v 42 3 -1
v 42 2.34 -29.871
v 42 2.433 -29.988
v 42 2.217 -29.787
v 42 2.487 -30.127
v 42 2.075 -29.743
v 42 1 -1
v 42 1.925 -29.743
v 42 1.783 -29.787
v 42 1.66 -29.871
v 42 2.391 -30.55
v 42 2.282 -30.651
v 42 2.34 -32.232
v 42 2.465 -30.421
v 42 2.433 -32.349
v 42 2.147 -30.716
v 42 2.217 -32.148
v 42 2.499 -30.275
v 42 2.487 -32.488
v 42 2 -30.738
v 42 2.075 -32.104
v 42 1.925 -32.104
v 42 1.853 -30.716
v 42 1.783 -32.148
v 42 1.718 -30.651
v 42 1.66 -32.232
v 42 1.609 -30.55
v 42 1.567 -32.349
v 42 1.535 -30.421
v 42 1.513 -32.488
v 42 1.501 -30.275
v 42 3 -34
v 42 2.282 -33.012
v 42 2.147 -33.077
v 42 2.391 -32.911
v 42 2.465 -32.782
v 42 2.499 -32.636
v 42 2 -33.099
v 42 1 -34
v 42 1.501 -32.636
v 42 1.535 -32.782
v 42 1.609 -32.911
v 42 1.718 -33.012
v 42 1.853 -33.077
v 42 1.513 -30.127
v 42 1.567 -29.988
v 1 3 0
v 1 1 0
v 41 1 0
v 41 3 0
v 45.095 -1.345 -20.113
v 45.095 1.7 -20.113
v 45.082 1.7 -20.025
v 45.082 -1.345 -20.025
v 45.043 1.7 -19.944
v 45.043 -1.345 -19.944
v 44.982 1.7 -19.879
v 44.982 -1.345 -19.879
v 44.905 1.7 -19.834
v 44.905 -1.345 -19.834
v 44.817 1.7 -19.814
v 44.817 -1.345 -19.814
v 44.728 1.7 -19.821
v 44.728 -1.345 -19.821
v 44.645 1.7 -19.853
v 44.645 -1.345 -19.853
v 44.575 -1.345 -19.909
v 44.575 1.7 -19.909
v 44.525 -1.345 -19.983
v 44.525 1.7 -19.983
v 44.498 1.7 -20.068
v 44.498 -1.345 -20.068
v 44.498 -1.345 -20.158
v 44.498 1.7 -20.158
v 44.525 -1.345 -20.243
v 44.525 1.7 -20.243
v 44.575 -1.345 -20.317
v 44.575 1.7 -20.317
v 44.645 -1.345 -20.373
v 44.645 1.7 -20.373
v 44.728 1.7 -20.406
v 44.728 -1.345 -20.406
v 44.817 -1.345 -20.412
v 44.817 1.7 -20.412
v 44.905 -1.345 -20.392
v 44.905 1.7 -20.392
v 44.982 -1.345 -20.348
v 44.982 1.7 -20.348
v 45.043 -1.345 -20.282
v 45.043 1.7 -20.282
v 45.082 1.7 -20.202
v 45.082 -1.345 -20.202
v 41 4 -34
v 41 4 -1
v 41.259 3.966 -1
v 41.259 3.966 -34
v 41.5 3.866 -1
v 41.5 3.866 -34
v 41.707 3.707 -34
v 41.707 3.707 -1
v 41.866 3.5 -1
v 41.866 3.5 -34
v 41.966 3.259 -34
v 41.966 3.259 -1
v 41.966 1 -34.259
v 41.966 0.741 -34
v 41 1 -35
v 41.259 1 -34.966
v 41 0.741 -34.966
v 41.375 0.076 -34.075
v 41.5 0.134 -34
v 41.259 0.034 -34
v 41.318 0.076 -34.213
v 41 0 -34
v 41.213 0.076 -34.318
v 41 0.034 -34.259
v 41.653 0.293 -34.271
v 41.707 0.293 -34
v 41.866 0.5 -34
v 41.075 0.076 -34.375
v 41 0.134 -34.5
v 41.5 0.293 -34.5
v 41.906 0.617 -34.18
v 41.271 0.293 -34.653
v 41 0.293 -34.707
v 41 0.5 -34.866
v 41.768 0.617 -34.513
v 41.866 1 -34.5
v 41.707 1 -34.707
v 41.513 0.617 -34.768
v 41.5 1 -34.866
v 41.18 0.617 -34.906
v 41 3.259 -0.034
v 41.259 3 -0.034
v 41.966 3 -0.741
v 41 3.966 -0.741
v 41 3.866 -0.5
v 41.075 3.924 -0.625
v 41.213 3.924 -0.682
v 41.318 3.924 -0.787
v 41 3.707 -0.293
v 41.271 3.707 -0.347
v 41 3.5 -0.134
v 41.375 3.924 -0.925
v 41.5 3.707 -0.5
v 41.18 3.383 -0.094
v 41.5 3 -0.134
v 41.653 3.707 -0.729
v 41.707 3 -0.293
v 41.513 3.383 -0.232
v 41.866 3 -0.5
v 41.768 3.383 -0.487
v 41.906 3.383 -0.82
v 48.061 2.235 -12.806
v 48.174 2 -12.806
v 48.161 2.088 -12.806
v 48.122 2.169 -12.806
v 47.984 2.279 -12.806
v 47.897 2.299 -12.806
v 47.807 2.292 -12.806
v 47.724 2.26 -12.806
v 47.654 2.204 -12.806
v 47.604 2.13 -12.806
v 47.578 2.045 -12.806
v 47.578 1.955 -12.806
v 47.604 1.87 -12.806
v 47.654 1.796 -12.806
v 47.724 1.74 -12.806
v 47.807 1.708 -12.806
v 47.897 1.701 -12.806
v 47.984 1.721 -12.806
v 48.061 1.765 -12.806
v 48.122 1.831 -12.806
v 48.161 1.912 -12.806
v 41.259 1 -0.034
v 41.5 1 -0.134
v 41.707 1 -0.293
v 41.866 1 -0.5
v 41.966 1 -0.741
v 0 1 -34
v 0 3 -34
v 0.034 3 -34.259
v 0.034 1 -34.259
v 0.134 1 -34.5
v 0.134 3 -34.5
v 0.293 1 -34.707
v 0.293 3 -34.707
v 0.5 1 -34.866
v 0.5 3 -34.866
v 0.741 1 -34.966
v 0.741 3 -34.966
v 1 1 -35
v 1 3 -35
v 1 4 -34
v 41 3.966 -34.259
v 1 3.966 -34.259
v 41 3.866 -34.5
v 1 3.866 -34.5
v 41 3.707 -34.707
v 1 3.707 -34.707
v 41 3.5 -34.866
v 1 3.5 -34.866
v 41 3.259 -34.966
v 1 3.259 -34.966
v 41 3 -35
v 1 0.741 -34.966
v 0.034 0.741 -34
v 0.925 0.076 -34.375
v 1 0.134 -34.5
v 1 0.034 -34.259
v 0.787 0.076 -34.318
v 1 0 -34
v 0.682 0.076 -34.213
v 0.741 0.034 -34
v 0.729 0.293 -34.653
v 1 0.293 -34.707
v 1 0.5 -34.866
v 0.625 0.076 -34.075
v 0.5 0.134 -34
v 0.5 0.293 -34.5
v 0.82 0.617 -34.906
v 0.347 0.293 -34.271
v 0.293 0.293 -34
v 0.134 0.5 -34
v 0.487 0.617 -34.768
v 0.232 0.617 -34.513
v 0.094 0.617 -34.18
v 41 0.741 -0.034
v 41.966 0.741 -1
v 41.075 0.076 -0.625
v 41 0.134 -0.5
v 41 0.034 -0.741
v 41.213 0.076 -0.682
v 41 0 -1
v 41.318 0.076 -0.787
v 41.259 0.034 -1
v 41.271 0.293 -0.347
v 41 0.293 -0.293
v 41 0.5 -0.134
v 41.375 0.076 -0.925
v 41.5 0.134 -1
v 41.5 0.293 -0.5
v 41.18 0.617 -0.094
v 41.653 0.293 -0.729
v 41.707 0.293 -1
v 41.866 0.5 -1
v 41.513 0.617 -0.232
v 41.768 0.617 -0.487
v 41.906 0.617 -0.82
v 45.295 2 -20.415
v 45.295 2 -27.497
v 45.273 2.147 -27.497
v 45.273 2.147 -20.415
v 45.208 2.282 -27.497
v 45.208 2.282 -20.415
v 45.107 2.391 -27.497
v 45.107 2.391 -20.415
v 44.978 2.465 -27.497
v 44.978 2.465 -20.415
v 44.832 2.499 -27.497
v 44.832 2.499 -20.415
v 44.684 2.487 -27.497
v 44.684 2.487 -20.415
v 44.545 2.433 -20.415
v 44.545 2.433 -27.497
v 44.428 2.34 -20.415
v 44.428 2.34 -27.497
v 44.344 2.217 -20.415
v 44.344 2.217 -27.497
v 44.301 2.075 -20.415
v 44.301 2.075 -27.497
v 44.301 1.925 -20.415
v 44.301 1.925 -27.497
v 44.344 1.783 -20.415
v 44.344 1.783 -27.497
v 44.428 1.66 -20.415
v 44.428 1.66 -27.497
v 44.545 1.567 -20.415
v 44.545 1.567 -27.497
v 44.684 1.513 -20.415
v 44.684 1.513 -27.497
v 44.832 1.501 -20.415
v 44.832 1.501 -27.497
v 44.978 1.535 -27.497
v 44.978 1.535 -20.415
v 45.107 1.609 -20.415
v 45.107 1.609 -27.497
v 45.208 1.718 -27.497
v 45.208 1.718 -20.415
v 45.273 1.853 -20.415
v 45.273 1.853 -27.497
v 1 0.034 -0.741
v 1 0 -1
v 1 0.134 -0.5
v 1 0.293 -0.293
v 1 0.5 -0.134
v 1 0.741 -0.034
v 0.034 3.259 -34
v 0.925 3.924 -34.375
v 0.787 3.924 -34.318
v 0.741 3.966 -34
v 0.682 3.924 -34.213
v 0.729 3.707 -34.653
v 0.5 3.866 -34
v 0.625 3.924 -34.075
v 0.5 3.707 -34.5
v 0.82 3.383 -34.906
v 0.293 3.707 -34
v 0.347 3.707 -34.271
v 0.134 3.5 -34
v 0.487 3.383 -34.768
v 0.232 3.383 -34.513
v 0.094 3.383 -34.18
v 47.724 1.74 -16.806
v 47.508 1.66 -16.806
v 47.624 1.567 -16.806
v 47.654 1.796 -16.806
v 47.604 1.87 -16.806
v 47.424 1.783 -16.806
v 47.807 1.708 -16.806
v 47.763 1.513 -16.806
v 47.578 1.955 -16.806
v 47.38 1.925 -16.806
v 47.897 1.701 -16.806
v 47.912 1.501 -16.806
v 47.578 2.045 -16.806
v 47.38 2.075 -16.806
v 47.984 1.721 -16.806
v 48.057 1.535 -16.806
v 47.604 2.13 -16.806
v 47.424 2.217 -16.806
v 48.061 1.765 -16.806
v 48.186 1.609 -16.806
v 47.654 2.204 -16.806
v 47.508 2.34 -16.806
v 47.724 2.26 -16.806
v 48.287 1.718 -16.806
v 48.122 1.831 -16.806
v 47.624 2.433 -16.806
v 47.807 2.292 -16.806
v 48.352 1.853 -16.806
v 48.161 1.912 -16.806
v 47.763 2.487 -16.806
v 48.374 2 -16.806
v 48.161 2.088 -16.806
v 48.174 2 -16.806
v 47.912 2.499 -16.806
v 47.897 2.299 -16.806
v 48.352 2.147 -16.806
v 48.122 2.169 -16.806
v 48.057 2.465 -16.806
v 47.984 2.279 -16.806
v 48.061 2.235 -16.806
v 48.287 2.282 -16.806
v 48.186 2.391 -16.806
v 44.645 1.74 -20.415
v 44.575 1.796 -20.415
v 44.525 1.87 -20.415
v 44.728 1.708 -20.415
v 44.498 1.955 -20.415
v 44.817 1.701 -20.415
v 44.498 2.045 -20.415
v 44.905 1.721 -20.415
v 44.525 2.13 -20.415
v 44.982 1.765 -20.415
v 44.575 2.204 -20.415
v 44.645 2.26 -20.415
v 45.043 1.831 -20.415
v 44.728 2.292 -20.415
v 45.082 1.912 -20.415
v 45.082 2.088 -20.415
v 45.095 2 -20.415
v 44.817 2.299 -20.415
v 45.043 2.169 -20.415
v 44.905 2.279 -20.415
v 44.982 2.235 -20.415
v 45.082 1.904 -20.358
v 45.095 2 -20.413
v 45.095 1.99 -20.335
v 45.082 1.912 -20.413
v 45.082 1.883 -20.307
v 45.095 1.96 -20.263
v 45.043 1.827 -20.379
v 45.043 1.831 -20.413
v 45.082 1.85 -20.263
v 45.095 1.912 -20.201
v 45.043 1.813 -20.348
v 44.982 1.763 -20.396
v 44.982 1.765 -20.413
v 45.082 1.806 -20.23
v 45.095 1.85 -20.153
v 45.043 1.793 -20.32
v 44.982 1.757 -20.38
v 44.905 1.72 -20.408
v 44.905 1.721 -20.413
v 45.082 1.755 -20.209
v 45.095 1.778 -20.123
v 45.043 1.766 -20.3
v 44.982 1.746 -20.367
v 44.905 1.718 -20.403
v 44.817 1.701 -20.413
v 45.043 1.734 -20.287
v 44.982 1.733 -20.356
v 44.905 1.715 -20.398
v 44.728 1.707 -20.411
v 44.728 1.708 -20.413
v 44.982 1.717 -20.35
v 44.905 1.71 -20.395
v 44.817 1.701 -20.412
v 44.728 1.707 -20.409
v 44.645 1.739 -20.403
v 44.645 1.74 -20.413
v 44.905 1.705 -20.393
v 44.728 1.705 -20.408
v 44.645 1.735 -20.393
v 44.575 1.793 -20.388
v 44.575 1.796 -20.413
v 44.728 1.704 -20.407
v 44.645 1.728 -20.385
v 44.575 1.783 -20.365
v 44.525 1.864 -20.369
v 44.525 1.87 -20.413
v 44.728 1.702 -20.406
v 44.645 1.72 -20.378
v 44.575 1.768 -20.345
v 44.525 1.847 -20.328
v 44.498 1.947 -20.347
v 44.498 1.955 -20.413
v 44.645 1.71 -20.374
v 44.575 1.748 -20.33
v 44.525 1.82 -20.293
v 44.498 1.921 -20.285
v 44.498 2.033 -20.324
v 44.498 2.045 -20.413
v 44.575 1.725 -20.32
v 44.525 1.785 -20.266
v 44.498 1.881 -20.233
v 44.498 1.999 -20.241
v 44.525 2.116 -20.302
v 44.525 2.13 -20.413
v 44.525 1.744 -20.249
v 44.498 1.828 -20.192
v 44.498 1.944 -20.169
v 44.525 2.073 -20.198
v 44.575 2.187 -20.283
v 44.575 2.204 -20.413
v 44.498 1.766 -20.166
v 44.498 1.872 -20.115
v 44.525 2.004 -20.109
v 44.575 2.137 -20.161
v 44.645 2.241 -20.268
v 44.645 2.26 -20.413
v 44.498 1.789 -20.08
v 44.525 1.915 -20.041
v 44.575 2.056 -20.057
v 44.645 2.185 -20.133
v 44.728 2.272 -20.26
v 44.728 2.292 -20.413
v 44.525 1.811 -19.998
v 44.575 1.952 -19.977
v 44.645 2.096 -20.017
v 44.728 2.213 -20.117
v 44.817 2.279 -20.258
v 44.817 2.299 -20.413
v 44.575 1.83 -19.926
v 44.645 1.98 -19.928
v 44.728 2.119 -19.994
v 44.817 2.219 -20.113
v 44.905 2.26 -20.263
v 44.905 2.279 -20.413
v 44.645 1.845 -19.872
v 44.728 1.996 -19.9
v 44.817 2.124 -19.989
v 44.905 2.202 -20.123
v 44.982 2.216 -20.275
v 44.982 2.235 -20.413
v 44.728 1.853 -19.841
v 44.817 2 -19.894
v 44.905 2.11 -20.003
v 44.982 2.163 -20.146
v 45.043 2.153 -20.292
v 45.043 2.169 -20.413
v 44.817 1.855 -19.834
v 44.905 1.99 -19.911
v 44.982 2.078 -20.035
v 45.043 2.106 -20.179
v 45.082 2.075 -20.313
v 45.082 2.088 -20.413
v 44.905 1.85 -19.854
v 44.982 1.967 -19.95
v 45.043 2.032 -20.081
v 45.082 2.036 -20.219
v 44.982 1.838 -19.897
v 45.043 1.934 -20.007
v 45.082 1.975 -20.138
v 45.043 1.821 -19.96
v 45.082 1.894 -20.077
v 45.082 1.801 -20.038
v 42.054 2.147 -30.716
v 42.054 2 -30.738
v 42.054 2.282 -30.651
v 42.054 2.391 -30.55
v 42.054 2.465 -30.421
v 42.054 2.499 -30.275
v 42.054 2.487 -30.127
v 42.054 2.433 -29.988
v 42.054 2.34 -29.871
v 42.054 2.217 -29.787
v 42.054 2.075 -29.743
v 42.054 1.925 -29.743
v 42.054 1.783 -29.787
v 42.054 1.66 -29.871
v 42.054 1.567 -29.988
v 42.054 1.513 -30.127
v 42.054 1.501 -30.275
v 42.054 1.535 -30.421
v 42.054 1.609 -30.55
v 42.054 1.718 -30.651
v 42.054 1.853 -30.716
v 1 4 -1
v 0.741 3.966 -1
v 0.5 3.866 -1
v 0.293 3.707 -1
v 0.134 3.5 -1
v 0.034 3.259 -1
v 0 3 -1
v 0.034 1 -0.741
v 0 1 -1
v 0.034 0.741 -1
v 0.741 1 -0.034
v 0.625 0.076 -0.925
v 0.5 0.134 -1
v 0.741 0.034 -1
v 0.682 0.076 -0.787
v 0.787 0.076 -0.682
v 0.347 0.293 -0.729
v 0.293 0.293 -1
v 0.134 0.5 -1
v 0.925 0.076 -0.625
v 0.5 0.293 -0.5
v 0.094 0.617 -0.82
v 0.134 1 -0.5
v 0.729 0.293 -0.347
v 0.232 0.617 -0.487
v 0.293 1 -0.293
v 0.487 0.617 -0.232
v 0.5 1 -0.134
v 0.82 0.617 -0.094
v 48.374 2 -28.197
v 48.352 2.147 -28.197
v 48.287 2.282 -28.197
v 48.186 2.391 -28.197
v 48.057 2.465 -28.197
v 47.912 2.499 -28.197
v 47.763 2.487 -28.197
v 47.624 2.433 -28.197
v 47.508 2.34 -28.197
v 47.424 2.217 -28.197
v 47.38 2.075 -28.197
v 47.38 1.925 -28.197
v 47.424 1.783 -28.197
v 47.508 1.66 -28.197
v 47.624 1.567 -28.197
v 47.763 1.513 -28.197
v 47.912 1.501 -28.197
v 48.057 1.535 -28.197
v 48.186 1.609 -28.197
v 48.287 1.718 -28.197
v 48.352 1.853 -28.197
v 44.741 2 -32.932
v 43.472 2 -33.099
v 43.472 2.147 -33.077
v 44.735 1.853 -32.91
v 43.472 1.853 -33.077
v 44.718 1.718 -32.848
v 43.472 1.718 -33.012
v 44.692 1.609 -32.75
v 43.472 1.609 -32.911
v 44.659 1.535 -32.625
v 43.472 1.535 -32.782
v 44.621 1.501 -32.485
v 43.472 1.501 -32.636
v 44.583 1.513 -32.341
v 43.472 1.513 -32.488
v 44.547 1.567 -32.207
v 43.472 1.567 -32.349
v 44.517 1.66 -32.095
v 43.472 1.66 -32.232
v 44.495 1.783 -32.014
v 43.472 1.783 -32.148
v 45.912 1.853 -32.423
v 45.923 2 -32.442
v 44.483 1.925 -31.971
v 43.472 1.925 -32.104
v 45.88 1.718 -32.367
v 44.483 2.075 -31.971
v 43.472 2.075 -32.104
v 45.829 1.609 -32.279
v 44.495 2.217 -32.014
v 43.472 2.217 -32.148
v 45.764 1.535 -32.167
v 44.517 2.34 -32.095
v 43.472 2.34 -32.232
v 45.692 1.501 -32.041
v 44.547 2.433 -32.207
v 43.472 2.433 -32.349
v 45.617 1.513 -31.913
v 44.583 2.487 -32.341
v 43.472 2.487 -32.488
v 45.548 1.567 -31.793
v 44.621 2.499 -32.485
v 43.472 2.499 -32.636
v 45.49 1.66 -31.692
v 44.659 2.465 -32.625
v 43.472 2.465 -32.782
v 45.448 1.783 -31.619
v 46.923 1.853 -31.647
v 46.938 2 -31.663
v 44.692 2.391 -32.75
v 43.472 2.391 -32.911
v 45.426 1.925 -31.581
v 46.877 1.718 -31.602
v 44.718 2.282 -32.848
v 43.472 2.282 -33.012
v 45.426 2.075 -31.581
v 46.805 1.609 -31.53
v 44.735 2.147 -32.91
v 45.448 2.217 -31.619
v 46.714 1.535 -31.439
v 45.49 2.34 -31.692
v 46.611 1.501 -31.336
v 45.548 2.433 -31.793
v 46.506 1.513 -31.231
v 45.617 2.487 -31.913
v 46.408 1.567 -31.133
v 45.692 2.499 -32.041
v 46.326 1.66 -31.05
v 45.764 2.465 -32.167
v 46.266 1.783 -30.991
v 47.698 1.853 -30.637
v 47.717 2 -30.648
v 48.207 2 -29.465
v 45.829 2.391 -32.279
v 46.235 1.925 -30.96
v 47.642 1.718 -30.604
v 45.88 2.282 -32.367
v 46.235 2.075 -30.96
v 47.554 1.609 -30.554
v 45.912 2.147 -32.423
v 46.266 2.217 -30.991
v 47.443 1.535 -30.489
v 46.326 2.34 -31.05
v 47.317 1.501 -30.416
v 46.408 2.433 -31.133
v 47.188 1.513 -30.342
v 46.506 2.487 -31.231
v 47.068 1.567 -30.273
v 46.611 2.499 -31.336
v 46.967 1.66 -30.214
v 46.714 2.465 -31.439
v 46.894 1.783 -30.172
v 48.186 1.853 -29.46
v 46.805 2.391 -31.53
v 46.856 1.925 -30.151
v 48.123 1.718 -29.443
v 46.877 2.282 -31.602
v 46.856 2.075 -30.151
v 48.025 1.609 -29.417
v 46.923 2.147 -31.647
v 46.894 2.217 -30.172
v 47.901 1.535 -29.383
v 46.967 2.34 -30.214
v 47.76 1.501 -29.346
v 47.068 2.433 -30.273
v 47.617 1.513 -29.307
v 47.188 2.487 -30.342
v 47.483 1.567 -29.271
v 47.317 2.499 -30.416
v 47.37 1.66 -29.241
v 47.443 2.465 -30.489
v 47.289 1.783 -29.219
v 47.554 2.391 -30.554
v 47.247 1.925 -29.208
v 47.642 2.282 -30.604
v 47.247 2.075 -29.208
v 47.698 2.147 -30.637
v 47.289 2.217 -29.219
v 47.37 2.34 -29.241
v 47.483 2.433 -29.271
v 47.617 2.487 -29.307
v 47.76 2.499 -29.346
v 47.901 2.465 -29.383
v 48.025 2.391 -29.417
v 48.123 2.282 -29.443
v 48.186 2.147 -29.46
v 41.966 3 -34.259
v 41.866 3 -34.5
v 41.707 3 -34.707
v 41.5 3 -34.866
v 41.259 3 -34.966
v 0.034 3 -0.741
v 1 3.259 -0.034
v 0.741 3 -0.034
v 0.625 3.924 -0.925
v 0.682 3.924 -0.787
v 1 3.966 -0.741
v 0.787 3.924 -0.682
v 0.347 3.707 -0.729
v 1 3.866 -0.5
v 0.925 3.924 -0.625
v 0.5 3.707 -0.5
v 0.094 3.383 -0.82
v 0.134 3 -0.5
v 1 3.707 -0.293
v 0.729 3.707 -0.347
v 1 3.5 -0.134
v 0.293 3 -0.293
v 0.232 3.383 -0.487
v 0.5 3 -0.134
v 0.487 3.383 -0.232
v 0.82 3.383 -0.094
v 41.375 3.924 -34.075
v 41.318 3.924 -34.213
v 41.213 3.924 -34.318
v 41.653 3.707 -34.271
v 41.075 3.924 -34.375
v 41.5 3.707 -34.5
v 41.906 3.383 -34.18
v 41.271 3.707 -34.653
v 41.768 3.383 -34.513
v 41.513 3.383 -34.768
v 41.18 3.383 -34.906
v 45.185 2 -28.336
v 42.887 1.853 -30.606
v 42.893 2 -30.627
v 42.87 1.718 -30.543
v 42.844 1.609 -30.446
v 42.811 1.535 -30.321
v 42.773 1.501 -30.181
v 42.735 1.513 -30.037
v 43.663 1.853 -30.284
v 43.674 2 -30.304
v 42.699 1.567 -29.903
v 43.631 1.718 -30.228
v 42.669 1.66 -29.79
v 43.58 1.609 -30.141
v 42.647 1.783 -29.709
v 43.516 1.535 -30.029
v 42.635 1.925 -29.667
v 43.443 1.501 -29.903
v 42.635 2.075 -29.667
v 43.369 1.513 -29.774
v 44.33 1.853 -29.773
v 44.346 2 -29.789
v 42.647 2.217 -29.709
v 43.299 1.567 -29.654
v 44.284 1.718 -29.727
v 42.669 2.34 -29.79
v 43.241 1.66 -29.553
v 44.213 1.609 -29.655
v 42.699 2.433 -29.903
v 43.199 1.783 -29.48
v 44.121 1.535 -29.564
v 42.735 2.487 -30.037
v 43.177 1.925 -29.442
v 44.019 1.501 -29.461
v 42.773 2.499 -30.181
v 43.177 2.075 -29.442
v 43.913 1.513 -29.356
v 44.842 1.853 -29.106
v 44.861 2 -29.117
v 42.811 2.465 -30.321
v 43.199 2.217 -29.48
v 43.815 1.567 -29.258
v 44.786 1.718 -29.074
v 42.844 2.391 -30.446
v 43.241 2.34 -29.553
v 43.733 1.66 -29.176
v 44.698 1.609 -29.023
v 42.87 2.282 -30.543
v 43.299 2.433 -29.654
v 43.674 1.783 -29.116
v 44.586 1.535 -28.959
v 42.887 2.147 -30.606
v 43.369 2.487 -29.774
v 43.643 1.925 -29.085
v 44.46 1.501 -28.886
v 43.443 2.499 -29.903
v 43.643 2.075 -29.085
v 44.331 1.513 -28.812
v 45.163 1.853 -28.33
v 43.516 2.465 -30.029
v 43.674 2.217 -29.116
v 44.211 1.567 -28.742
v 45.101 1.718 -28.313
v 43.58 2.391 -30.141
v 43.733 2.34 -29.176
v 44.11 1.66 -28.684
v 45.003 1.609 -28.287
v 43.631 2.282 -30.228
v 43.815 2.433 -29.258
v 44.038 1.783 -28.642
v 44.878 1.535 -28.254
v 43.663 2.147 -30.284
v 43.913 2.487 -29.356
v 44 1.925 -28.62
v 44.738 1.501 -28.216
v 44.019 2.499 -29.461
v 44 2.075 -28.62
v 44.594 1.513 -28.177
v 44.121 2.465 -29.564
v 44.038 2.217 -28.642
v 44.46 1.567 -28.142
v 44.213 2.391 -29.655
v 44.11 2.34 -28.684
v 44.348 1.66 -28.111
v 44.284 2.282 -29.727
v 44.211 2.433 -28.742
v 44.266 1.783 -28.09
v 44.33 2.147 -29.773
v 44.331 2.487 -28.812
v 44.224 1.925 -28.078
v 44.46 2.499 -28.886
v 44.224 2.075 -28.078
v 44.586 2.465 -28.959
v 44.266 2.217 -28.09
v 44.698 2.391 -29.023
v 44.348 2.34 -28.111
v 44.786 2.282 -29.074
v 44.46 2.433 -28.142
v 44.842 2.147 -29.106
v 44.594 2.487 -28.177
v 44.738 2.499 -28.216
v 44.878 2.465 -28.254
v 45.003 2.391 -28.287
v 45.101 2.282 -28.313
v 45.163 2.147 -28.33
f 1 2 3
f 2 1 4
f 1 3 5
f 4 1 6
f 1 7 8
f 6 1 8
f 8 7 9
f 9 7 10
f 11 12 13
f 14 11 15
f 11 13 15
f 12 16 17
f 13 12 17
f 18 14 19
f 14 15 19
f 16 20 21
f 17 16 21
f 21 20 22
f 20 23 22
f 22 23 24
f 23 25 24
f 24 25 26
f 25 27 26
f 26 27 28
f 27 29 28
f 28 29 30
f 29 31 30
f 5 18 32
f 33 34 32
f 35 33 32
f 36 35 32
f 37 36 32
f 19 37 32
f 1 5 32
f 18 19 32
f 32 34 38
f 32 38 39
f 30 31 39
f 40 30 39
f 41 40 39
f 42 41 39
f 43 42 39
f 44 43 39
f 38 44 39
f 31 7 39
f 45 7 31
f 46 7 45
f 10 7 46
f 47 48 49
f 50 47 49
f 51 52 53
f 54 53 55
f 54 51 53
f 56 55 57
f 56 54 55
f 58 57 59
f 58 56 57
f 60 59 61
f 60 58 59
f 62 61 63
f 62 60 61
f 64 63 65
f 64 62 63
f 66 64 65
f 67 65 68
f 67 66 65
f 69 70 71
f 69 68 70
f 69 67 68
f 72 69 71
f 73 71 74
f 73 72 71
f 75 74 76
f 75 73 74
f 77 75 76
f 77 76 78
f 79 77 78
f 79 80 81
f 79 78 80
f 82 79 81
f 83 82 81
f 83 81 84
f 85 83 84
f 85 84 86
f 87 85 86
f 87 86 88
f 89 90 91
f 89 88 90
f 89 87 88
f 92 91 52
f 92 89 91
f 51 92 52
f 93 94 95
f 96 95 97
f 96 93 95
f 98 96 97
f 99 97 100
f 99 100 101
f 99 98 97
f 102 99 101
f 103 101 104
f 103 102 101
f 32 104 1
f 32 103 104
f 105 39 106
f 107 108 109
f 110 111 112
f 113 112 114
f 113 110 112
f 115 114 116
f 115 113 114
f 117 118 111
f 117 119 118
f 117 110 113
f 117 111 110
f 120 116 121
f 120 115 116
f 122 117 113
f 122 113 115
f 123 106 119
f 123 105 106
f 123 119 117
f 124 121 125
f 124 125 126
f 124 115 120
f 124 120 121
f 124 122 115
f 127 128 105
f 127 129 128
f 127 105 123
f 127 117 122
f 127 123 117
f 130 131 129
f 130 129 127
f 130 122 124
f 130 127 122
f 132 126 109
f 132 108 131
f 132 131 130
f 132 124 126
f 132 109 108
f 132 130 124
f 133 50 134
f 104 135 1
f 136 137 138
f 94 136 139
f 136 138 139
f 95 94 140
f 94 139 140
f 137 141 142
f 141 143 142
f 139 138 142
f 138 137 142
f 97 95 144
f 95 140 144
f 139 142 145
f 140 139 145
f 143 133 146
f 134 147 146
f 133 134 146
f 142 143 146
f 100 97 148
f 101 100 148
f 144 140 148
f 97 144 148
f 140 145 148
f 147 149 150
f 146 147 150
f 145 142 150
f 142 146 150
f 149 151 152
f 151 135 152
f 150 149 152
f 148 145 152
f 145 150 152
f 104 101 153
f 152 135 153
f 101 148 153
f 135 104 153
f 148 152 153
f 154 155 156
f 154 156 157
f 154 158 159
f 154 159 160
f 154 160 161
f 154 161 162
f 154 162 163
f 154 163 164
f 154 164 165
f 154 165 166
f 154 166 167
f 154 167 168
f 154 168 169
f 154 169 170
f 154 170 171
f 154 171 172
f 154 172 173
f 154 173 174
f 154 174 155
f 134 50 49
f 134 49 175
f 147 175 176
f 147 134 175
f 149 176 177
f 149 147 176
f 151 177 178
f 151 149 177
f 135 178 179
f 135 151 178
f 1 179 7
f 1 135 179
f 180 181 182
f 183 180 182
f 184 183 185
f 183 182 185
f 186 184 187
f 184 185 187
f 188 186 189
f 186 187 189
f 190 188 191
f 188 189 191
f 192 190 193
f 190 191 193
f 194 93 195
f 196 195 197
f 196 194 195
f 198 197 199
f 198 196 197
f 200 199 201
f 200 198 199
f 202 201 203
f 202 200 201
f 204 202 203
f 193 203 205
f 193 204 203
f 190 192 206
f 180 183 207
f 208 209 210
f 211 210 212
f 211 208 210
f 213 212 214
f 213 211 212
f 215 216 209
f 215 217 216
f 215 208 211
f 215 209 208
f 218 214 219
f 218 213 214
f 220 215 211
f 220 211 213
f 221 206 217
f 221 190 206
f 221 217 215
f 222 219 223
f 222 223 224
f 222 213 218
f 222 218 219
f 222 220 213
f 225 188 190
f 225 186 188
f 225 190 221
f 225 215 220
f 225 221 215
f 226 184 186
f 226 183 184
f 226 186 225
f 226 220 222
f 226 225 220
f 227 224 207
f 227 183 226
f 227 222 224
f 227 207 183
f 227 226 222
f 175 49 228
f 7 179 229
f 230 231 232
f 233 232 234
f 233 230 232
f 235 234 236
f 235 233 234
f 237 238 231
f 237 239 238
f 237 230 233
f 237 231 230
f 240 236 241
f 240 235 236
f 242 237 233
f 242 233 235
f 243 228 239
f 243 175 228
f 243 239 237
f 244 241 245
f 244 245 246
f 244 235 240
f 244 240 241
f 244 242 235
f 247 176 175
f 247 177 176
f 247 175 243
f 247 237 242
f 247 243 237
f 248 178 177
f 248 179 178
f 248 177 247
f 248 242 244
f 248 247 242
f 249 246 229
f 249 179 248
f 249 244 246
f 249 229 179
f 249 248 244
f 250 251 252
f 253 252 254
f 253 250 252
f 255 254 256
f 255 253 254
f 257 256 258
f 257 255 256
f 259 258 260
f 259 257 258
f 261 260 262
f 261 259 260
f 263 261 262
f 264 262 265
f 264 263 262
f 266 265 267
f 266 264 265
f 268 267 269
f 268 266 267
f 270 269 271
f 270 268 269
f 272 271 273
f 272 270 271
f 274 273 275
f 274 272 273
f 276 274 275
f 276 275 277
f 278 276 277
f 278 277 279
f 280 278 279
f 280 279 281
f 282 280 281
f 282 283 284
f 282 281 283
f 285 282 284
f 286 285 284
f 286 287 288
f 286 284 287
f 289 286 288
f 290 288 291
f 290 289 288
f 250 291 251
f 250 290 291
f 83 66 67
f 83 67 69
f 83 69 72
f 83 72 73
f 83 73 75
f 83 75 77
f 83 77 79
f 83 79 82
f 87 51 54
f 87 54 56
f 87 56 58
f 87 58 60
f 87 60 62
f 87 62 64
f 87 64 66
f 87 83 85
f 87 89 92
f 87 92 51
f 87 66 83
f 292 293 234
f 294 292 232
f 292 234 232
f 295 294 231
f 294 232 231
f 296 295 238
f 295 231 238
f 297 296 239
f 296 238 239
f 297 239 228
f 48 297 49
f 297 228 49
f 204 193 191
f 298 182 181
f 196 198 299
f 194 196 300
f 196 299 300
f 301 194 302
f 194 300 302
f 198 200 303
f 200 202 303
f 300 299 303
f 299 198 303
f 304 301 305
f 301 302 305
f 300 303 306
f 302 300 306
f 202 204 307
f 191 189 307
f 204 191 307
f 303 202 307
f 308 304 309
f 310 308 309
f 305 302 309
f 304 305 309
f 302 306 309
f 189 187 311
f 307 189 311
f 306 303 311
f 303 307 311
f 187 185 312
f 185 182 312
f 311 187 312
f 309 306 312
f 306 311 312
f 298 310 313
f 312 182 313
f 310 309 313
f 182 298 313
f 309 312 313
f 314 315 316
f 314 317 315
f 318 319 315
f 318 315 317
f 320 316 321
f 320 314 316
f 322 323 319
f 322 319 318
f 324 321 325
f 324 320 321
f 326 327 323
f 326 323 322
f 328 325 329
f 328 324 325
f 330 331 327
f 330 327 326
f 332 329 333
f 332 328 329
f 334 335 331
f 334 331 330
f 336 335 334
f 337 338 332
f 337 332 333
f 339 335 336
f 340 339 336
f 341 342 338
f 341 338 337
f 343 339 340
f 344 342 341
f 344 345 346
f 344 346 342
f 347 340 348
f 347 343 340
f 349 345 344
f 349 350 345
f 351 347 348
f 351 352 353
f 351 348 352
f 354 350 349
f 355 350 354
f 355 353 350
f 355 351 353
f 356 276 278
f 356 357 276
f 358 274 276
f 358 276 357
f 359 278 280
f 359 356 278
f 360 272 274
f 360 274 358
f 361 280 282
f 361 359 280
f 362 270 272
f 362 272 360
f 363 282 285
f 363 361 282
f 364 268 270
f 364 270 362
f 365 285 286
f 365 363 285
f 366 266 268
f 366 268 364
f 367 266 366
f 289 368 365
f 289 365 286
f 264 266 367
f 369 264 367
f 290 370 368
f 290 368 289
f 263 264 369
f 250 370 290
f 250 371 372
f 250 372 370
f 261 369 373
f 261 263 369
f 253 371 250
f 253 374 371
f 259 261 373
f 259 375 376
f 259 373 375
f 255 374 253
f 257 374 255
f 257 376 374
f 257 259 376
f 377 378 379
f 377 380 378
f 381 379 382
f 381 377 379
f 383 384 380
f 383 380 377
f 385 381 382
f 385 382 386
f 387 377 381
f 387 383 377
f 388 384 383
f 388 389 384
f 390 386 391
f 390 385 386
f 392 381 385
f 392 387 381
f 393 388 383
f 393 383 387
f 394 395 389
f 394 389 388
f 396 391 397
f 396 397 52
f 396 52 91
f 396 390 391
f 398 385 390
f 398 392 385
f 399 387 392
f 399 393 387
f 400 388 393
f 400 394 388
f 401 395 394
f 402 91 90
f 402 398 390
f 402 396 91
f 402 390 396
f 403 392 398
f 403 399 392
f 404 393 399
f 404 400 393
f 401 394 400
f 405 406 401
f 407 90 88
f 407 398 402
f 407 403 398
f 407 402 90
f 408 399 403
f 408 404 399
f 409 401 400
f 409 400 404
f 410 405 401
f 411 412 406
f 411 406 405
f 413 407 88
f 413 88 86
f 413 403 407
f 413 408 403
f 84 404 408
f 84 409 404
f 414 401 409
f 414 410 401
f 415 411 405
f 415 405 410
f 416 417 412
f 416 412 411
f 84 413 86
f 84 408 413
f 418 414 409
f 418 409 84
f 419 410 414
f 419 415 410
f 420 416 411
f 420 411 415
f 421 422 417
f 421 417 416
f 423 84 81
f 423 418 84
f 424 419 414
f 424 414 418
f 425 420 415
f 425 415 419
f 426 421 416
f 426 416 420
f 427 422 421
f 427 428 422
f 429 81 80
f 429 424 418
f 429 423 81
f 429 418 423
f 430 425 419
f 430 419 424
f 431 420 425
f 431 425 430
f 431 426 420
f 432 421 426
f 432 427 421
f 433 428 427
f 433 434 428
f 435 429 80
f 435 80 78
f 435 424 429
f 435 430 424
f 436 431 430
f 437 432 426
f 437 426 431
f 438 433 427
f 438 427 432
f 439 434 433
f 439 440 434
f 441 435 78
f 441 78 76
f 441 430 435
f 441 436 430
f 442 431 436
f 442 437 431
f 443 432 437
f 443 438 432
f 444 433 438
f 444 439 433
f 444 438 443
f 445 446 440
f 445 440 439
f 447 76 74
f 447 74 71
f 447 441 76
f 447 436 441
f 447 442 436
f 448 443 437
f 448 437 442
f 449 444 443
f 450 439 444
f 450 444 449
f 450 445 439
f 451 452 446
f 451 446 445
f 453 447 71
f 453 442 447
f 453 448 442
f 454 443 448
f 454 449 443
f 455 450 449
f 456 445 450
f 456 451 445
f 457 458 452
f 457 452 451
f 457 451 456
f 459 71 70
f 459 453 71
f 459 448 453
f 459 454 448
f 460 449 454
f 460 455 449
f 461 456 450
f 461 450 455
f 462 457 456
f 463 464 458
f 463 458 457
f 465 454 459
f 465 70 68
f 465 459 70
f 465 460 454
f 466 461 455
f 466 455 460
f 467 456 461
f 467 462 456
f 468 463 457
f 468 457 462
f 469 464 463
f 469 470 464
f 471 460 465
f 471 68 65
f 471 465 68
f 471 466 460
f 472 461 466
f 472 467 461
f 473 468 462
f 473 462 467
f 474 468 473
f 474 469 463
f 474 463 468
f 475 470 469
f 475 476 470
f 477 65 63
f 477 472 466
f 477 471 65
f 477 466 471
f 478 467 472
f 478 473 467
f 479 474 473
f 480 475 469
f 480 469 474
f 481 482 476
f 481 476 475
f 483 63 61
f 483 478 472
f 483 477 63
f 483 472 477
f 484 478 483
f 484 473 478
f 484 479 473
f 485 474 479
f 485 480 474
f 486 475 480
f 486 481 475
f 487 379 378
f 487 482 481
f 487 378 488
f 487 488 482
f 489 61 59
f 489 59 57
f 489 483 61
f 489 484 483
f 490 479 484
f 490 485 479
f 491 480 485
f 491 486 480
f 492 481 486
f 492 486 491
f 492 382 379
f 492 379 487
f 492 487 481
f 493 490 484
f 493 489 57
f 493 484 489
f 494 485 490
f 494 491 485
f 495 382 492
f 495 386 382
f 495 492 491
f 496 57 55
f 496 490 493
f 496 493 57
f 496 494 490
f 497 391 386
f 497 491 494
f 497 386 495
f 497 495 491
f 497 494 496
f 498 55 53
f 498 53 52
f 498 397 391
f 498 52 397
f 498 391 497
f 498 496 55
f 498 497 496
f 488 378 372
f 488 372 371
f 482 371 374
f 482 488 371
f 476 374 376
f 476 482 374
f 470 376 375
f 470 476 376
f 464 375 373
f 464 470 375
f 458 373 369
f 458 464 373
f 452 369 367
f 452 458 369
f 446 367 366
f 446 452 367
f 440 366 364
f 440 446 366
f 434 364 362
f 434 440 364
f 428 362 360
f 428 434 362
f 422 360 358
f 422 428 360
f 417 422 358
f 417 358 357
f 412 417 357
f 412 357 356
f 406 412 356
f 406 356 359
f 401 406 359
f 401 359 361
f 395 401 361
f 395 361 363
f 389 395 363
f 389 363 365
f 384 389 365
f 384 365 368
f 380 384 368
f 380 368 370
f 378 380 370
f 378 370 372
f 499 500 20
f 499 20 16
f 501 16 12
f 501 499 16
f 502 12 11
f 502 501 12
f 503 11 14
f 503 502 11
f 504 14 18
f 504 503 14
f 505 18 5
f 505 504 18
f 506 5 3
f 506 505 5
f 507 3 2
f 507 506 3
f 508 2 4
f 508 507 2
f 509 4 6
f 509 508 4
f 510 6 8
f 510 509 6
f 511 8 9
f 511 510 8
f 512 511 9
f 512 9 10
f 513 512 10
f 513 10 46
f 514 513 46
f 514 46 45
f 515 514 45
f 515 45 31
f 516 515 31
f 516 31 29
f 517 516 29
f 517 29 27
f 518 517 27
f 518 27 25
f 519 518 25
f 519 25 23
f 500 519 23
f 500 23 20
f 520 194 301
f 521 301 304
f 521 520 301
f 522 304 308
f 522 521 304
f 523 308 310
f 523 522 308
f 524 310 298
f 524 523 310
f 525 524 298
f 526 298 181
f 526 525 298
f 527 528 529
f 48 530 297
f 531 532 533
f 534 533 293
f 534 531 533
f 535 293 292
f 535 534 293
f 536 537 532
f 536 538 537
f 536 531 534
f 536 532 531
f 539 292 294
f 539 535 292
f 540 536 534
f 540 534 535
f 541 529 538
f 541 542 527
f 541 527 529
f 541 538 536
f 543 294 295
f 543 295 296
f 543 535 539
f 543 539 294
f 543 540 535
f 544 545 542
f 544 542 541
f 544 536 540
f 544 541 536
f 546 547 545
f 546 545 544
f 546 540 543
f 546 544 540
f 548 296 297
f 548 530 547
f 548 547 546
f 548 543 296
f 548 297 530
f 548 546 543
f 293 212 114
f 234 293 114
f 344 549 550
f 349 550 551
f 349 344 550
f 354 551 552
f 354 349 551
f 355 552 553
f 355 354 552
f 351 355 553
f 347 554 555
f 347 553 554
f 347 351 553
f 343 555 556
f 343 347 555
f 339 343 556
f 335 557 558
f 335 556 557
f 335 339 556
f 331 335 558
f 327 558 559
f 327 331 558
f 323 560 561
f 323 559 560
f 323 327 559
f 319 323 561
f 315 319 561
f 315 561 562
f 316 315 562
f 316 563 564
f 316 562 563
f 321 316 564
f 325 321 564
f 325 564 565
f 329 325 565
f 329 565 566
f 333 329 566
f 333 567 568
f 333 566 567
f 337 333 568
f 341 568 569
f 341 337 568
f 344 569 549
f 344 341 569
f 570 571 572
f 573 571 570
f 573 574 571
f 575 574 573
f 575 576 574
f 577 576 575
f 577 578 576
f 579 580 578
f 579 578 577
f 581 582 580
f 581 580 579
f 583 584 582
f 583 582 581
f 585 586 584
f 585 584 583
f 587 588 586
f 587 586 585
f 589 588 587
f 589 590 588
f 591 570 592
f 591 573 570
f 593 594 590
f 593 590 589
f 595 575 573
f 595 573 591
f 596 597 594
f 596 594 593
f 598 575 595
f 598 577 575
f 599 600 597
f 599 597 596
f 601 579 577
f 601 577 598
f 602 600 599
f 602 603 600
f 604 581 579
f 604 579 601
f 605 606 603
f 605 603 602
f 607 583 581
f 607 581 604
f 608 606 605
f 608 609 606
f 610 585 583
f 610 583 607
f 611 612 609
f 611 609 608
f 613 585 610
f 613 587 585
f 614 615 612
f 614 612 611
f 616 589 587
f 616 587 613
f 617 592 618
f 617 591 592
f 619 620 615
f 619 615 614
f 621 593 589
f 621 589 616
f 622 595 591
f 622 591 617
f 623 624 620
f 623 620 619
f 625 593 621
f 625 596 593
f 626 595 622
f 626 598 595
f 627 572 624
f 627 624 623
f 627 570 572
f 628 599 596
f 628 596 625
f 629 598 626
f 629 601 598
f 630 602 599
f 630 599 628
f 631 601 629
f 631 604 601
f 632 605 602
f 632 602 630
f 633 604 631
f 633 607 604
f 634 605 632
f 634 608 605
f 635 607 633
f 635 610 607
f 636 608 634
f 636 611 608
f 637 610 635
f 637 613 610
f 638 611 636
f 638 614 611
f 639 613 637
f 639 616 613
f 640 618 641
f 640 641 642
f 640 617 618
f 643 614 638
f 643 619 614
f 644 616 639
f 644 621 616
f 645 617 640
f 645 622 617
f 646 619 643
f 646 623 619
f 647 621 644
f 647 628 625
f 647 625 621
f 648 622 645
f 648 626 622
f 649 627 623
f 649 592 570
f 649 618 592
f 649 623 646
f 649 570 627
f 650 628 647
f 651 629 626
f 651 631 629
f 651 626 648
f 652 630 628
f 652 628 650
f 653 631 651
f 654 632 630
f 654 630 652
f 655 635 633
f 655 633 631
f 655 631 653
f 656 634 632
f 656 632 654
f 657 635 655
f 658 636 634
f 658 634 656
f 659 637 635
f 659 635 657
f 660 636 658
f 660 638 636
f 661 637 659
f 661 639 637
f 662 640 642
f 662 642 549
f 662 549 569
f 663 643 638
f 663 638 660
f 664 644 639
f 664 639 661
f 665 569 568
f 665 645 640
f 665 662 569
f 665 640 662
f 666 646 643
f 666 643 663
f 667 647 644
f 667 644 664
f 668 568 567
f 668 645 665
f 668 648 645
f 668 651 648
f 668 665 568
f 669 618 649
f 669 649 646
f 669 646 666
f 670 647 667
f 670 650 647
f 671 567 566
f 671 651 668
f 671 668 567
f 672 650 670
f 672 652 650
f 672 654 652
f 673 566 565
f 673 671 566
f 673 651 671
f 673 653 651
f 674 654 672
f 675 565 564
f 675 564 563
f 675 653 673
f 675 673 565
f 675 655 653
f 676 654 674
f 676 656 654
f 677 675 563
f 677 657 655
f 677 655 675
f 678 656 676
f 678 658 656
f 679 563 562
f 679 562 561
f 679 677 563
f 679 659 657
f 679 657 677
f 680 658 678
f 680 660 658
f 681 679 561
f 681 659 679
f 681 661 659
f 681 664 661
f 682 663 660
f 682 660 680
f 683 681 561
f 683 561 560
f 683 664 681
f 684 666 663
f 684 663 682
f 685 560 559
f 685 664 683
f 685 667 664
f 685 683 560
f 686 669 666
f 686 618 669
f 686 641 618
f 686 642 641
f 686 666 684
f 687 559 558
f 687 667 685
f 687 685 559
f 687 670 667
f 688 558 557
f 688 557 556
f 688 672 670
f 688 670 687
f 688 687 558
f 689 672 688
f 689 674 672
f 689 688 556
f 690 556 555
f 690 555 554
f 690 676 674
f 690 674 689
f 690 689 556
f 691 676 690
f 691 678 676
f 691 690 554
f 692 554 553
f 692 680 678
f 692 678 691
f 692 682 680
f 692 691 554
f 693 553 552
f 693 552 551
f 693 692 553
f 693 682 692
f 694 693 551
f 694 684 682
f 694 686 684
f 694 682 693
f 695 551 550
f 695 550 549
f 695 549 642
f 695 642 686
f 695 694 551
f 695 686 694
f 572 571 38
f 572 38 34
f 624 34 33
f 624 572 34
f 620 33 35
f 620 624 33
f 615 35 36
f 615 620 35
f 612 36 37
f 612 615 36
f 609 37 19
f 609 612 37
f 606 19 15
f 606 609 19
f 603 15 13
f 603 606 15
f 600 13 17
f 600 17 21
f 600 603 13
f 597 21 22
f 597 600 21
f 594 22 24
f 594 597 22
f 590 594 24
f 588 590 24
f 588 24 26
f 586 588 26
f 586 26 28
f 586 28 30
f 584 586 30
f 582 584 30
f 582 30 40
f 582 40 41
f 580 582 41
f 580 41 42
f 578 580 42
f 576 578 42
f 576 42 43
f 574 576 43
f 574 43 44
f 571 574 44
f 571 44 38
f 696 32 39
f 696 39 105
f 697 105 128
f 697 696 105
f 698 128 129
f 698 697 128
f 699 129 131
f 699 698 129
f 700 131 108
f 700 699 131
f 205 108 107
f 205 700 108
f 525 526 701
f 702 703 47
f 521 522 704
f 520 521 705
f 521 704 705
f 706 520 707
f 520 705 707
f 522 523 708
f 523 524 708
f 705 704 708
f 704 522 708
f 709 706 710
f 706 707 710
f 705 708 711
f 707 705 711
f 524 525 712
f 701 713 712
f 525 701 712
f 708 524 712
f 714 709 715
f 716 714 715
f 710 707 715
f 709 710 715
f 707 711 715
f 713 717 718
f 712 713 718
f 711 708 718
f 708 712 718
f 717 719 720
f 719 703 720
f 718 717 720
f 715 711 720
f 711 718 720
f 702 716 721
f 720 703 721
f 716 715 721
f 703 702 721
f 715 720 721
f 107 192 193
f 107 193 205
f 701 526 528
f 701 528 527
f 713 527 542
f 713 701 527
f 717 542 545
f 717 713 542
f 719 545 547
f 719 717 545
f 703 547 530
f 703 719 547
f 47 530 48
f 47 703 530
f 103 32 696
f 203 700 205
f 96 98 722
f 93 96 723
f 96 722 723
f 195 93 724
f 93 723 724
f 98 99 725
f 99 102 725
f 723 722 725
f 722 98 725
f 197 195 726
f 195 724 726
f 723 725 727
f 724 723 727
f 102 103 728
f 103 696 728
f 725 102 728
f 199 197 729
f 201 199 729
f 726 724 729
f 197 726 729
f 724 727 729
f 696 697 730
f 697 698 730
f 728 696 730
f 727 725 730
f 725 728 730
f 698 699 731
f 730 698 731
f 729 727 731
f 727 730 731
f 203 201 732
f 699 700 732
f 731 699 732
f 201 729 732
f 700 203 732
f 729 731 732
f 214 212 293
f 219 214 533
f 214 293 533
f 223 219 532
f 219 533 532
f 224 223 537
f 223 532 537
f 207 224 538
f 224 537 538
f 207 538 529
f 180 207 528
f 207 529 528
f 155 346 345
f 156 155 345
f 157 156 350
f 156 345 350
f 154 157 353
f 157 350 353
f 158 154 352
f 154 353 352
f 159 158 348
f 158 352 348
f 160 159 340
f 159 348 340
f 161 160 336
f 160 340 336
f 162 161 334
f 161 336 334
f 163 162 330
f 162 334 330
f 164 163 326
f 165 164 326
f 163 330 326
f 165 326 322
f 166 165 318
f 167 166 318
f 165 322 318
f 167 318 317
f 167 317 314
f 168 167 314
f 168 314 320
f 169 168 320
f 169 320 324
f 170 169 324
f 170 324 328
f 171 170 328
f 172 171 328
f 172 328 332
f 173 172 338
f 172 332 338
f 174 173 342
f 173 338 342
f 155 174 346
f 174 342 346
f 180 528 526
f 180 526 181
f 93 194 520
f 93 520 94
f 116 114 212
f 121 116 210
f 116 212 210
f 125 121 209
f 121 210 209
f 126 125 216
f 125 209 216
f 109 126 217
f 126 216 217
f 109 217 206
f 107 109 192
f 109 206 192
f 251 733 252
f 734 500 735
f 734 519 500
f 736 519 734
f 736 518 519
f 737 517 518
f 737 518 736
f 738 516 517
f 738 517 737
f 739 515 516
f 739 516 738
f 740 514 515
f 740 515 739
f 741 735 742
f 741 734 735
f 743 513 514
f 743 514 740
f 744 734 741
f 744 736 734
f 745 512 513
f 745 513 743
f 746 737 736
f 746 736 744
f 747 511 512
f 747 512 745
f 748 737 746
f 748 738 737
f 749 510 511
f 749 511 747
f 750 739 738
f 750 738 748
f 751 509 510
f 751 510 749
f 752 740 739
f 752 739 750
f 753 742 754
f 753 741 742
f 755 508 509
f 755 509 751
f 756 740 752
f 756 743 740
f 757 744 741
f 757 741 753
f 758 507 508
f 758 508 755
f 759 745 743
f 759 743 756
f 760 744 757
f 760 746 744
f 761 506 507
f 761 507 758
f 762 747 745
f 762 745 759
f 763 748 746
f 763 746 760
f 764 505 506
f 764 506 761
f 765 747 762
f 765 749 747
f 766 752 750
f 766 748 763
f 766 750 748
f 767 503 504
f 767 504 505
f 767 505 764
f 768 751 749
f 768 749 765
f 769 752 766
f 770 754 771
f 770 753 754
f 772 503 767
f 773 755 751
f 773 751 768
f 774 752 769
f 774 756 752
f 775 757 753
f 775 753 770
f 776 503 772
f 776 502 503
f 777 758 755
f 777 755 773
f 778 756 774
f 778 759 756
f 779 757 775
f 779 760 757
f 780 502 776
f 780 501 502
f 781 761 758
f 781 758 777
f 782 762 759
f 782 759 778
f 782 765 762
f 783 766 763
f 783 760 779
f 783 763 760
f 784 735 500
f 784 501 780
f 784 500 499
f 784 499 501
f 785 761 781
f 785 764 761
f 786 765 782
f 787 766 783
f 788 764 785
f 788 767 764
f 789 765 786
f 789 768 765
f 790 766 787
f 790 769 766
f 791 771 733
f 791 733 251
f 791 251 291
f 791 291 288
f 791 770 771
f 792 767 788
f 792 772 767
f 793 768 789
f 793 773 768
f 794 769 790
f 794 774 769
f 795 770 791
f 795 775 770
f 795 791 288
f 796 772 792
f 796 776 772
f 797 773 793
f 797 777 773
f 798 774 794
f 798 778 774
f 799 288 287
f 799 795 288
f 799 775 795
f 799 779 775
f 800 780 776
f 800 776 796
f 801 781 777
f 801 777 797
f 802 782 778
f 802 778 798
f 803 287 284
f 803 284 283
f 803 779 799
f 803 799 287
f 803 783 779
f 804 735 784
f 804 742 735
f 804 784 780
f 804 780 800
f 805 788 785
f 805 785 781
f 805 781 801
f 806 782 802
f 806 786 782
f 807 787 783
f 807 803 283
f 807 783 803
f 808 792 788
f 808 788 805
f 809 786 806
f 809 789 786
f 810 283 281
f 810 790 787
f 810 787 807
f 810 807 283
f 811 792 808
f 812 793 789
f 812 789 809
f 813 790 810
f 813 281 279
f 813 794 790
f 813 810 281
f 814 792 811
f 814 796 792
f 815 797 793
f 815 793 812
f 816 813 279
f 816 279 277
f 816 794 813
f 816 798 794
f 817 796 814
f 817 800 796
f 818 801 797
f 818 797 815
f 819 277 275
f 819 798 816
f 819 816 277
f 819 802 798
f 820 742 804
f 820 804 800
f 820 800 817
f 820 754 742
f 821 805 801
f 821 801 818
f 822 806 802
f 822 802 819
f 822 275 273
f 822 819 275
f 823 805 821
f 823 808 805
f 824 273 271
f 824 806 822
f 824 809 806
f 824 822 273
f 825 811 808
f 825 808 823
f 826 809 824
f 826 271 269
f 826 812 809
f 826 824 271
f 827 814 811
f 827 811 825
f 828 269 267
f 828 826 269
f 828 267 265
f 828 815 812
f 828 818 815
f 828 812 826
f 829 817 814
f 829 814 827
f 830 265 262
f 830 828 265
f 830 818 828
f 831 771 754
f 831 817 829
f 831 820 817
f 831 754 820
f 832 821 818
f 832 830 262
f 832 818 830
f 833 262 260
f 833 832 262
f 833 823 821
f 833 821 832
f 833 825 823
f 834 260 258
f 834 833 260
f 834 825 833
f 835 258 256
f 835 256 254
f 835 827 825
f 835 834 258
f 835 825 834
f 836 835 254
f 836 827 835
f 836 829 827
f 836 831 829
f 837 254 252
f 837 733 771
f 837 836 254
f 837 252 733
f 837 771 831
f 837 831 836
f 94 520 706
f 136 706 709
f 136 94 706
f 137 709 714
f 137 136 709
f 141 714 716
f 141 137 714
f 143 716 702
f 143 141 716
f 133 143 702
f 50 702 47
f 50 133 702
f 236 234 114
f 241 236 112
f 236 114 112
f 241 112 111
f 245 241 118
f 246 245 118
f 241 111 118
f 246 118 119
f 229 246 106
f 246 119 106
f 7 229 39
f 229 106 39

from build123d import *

# Parameters (mm, degrees)
SKETCH1_W           = 42
SKETCH1_H           = 35
BOSS_EXTRUDE1_DEPTH = 4
FILLET1_R           = 1
FILLET2_R           = 1
SKETCH2_R           = 0.5
SKETCH5_R           = 0.5
SKETCH10_R          = 0.3
SKETCH13_R          = 0.3
BOSS_EXTRUDE2_DEPTH = 4


with BuildPart() as part:
    # Sketch1 → Boss-Extrude1 (new body)
    with BuildSketch(Plane(origin=(0, 0, 0), x_dir=(1, 0, 0), z_dir=(0, 1, 0))):
        with Locations((21, 17.5)):
            Rectangle(SKETCH1_W, SKETCH1_H)
    extrude(amount=BOSS_EXTRUDE1_DEPTH)

    # Fillet1
    fillet1_edges = [part.edges().sort_by_distance(p)[0] for p in [
        (0, 2, 0),
        (42, 2, 0),
        (42, 2, -35),
        (0, 2, -35),
    ]]
    fillet(fillet1_edges, radius=FILLET1_R)

    # Fillet2
    fillet2_edges = [part.edges().sort_by_distance(p)[0] for p in [
        (42, 0, -17.5),
        (42, 4, -17.5),
        (0, 0, -17.5),
        (21, 0, -35),
        (21, 0, 0),
        (0.292893219, 0, -0.292893219),
        (0.292893219, 0, -34.707106781),
        (41.707106781, 0, -34.707106781),
        (41.707106781, 0, -0.292893219),
        (21, 4, 0),
        (0, 4, -17.5),
        (21, 4, -35),
        (0.292893219, 4, -0.292893219),
        (0.292893219, 4, -34.707106781),
        (41.707106781, 4, -34.707106781),
        (41.707106781, 4, -0.292893219),
    ]]
    fillet(fillet2_edges, radius=FILLET2_R)

    # Sweep2: sweep along a path in Sketch4
    with BuildLine(Plane(origin=(0, 0, 0), x_dir=(1, 0, 0), z_dir=(0, 1, 0))) as sweep2_path:
        Line((42, 32.598834146), (43.472011027, 32.598834146))
        ThreePointArc((43.472011027, 32.598834146), (46.584840442, 31.309457985), (47.874216603, 28.19662857))
        Line((47.874216603, 28.19662857), (47.874216603, 16.805737351))
    # Sketch2 → Sweep2 (sweep)
    with BuildSketch(Plane(origin=(42, 0, 0), x_dir=(0, 0, -1), z_dir=(1, 0, 0))):
        with Locations((32.598834146, 2)):
            Circle(SKETCH2_R)
    sweep(path=sweep2_path.line)

    # Sweep3: sweep along a path in Sketch6
    with BuildLine(Plane(origin=(0, 0, 0), x_dir=(1, 0, 0), z_dir=(0, 1, 0))) as sweep3_path:
        Line((42, 30.237830041), (42.053967758, 30.237830041))
        ThreePointArc((42.053967758, 30.237830041), (43.992158066, 29.435005329), (44.794982779, 27.49681502))
        Line((44.794982779, 27.49681502), (44.794982779, 20.415467716))
    # Sketch5 → Sweep3 (sweep)
    with BuildSketch(Plane(origin=(42, 0, 0), x_dir=(0, 0, -1), z_dir=(1, 0, 0))):
        with Locations((30.237830041, 2)):
            Circle(SKETCH5_R)
    sweep(path=sweep3_path.line)

    # Sweep5: sweep along a path in Sketch12
    with BuildLine(Plane(origin=(44.828772476, 0, 0), x_dir=(0, 0, -1), z_dir=(1, 0, 0))) as sweep5_path:
        Line((20.415467716, 2), (20.413075866, 2))
        ThreePointArc((20.413075866, 2), (20.200943832, 1.912132034), (20.113075866, 1.7))
        Line((20.113075866, 1.7), (20.113075866, -1.34465824))
    # Sketch10 → Sweep5 (sweep)
    with BuildSketch(Plane.XY.offset(-20.415467716)):
        with Locations((44.794982779, 2)):
            Circle(SKETCH10_R)
    sweep(path=sweep5_path.line)

    # Sketch13 → Boss-Extrude2 (add)
    with BuildSketch(Plane.XY.offset(-16.805737351)):
        with Locations((47.874216603, 2)):
            Circle(SKETCH13_R)
    extrude(amount=BOSS_EXTRUDE2_DEPTH)


solid = part.part
